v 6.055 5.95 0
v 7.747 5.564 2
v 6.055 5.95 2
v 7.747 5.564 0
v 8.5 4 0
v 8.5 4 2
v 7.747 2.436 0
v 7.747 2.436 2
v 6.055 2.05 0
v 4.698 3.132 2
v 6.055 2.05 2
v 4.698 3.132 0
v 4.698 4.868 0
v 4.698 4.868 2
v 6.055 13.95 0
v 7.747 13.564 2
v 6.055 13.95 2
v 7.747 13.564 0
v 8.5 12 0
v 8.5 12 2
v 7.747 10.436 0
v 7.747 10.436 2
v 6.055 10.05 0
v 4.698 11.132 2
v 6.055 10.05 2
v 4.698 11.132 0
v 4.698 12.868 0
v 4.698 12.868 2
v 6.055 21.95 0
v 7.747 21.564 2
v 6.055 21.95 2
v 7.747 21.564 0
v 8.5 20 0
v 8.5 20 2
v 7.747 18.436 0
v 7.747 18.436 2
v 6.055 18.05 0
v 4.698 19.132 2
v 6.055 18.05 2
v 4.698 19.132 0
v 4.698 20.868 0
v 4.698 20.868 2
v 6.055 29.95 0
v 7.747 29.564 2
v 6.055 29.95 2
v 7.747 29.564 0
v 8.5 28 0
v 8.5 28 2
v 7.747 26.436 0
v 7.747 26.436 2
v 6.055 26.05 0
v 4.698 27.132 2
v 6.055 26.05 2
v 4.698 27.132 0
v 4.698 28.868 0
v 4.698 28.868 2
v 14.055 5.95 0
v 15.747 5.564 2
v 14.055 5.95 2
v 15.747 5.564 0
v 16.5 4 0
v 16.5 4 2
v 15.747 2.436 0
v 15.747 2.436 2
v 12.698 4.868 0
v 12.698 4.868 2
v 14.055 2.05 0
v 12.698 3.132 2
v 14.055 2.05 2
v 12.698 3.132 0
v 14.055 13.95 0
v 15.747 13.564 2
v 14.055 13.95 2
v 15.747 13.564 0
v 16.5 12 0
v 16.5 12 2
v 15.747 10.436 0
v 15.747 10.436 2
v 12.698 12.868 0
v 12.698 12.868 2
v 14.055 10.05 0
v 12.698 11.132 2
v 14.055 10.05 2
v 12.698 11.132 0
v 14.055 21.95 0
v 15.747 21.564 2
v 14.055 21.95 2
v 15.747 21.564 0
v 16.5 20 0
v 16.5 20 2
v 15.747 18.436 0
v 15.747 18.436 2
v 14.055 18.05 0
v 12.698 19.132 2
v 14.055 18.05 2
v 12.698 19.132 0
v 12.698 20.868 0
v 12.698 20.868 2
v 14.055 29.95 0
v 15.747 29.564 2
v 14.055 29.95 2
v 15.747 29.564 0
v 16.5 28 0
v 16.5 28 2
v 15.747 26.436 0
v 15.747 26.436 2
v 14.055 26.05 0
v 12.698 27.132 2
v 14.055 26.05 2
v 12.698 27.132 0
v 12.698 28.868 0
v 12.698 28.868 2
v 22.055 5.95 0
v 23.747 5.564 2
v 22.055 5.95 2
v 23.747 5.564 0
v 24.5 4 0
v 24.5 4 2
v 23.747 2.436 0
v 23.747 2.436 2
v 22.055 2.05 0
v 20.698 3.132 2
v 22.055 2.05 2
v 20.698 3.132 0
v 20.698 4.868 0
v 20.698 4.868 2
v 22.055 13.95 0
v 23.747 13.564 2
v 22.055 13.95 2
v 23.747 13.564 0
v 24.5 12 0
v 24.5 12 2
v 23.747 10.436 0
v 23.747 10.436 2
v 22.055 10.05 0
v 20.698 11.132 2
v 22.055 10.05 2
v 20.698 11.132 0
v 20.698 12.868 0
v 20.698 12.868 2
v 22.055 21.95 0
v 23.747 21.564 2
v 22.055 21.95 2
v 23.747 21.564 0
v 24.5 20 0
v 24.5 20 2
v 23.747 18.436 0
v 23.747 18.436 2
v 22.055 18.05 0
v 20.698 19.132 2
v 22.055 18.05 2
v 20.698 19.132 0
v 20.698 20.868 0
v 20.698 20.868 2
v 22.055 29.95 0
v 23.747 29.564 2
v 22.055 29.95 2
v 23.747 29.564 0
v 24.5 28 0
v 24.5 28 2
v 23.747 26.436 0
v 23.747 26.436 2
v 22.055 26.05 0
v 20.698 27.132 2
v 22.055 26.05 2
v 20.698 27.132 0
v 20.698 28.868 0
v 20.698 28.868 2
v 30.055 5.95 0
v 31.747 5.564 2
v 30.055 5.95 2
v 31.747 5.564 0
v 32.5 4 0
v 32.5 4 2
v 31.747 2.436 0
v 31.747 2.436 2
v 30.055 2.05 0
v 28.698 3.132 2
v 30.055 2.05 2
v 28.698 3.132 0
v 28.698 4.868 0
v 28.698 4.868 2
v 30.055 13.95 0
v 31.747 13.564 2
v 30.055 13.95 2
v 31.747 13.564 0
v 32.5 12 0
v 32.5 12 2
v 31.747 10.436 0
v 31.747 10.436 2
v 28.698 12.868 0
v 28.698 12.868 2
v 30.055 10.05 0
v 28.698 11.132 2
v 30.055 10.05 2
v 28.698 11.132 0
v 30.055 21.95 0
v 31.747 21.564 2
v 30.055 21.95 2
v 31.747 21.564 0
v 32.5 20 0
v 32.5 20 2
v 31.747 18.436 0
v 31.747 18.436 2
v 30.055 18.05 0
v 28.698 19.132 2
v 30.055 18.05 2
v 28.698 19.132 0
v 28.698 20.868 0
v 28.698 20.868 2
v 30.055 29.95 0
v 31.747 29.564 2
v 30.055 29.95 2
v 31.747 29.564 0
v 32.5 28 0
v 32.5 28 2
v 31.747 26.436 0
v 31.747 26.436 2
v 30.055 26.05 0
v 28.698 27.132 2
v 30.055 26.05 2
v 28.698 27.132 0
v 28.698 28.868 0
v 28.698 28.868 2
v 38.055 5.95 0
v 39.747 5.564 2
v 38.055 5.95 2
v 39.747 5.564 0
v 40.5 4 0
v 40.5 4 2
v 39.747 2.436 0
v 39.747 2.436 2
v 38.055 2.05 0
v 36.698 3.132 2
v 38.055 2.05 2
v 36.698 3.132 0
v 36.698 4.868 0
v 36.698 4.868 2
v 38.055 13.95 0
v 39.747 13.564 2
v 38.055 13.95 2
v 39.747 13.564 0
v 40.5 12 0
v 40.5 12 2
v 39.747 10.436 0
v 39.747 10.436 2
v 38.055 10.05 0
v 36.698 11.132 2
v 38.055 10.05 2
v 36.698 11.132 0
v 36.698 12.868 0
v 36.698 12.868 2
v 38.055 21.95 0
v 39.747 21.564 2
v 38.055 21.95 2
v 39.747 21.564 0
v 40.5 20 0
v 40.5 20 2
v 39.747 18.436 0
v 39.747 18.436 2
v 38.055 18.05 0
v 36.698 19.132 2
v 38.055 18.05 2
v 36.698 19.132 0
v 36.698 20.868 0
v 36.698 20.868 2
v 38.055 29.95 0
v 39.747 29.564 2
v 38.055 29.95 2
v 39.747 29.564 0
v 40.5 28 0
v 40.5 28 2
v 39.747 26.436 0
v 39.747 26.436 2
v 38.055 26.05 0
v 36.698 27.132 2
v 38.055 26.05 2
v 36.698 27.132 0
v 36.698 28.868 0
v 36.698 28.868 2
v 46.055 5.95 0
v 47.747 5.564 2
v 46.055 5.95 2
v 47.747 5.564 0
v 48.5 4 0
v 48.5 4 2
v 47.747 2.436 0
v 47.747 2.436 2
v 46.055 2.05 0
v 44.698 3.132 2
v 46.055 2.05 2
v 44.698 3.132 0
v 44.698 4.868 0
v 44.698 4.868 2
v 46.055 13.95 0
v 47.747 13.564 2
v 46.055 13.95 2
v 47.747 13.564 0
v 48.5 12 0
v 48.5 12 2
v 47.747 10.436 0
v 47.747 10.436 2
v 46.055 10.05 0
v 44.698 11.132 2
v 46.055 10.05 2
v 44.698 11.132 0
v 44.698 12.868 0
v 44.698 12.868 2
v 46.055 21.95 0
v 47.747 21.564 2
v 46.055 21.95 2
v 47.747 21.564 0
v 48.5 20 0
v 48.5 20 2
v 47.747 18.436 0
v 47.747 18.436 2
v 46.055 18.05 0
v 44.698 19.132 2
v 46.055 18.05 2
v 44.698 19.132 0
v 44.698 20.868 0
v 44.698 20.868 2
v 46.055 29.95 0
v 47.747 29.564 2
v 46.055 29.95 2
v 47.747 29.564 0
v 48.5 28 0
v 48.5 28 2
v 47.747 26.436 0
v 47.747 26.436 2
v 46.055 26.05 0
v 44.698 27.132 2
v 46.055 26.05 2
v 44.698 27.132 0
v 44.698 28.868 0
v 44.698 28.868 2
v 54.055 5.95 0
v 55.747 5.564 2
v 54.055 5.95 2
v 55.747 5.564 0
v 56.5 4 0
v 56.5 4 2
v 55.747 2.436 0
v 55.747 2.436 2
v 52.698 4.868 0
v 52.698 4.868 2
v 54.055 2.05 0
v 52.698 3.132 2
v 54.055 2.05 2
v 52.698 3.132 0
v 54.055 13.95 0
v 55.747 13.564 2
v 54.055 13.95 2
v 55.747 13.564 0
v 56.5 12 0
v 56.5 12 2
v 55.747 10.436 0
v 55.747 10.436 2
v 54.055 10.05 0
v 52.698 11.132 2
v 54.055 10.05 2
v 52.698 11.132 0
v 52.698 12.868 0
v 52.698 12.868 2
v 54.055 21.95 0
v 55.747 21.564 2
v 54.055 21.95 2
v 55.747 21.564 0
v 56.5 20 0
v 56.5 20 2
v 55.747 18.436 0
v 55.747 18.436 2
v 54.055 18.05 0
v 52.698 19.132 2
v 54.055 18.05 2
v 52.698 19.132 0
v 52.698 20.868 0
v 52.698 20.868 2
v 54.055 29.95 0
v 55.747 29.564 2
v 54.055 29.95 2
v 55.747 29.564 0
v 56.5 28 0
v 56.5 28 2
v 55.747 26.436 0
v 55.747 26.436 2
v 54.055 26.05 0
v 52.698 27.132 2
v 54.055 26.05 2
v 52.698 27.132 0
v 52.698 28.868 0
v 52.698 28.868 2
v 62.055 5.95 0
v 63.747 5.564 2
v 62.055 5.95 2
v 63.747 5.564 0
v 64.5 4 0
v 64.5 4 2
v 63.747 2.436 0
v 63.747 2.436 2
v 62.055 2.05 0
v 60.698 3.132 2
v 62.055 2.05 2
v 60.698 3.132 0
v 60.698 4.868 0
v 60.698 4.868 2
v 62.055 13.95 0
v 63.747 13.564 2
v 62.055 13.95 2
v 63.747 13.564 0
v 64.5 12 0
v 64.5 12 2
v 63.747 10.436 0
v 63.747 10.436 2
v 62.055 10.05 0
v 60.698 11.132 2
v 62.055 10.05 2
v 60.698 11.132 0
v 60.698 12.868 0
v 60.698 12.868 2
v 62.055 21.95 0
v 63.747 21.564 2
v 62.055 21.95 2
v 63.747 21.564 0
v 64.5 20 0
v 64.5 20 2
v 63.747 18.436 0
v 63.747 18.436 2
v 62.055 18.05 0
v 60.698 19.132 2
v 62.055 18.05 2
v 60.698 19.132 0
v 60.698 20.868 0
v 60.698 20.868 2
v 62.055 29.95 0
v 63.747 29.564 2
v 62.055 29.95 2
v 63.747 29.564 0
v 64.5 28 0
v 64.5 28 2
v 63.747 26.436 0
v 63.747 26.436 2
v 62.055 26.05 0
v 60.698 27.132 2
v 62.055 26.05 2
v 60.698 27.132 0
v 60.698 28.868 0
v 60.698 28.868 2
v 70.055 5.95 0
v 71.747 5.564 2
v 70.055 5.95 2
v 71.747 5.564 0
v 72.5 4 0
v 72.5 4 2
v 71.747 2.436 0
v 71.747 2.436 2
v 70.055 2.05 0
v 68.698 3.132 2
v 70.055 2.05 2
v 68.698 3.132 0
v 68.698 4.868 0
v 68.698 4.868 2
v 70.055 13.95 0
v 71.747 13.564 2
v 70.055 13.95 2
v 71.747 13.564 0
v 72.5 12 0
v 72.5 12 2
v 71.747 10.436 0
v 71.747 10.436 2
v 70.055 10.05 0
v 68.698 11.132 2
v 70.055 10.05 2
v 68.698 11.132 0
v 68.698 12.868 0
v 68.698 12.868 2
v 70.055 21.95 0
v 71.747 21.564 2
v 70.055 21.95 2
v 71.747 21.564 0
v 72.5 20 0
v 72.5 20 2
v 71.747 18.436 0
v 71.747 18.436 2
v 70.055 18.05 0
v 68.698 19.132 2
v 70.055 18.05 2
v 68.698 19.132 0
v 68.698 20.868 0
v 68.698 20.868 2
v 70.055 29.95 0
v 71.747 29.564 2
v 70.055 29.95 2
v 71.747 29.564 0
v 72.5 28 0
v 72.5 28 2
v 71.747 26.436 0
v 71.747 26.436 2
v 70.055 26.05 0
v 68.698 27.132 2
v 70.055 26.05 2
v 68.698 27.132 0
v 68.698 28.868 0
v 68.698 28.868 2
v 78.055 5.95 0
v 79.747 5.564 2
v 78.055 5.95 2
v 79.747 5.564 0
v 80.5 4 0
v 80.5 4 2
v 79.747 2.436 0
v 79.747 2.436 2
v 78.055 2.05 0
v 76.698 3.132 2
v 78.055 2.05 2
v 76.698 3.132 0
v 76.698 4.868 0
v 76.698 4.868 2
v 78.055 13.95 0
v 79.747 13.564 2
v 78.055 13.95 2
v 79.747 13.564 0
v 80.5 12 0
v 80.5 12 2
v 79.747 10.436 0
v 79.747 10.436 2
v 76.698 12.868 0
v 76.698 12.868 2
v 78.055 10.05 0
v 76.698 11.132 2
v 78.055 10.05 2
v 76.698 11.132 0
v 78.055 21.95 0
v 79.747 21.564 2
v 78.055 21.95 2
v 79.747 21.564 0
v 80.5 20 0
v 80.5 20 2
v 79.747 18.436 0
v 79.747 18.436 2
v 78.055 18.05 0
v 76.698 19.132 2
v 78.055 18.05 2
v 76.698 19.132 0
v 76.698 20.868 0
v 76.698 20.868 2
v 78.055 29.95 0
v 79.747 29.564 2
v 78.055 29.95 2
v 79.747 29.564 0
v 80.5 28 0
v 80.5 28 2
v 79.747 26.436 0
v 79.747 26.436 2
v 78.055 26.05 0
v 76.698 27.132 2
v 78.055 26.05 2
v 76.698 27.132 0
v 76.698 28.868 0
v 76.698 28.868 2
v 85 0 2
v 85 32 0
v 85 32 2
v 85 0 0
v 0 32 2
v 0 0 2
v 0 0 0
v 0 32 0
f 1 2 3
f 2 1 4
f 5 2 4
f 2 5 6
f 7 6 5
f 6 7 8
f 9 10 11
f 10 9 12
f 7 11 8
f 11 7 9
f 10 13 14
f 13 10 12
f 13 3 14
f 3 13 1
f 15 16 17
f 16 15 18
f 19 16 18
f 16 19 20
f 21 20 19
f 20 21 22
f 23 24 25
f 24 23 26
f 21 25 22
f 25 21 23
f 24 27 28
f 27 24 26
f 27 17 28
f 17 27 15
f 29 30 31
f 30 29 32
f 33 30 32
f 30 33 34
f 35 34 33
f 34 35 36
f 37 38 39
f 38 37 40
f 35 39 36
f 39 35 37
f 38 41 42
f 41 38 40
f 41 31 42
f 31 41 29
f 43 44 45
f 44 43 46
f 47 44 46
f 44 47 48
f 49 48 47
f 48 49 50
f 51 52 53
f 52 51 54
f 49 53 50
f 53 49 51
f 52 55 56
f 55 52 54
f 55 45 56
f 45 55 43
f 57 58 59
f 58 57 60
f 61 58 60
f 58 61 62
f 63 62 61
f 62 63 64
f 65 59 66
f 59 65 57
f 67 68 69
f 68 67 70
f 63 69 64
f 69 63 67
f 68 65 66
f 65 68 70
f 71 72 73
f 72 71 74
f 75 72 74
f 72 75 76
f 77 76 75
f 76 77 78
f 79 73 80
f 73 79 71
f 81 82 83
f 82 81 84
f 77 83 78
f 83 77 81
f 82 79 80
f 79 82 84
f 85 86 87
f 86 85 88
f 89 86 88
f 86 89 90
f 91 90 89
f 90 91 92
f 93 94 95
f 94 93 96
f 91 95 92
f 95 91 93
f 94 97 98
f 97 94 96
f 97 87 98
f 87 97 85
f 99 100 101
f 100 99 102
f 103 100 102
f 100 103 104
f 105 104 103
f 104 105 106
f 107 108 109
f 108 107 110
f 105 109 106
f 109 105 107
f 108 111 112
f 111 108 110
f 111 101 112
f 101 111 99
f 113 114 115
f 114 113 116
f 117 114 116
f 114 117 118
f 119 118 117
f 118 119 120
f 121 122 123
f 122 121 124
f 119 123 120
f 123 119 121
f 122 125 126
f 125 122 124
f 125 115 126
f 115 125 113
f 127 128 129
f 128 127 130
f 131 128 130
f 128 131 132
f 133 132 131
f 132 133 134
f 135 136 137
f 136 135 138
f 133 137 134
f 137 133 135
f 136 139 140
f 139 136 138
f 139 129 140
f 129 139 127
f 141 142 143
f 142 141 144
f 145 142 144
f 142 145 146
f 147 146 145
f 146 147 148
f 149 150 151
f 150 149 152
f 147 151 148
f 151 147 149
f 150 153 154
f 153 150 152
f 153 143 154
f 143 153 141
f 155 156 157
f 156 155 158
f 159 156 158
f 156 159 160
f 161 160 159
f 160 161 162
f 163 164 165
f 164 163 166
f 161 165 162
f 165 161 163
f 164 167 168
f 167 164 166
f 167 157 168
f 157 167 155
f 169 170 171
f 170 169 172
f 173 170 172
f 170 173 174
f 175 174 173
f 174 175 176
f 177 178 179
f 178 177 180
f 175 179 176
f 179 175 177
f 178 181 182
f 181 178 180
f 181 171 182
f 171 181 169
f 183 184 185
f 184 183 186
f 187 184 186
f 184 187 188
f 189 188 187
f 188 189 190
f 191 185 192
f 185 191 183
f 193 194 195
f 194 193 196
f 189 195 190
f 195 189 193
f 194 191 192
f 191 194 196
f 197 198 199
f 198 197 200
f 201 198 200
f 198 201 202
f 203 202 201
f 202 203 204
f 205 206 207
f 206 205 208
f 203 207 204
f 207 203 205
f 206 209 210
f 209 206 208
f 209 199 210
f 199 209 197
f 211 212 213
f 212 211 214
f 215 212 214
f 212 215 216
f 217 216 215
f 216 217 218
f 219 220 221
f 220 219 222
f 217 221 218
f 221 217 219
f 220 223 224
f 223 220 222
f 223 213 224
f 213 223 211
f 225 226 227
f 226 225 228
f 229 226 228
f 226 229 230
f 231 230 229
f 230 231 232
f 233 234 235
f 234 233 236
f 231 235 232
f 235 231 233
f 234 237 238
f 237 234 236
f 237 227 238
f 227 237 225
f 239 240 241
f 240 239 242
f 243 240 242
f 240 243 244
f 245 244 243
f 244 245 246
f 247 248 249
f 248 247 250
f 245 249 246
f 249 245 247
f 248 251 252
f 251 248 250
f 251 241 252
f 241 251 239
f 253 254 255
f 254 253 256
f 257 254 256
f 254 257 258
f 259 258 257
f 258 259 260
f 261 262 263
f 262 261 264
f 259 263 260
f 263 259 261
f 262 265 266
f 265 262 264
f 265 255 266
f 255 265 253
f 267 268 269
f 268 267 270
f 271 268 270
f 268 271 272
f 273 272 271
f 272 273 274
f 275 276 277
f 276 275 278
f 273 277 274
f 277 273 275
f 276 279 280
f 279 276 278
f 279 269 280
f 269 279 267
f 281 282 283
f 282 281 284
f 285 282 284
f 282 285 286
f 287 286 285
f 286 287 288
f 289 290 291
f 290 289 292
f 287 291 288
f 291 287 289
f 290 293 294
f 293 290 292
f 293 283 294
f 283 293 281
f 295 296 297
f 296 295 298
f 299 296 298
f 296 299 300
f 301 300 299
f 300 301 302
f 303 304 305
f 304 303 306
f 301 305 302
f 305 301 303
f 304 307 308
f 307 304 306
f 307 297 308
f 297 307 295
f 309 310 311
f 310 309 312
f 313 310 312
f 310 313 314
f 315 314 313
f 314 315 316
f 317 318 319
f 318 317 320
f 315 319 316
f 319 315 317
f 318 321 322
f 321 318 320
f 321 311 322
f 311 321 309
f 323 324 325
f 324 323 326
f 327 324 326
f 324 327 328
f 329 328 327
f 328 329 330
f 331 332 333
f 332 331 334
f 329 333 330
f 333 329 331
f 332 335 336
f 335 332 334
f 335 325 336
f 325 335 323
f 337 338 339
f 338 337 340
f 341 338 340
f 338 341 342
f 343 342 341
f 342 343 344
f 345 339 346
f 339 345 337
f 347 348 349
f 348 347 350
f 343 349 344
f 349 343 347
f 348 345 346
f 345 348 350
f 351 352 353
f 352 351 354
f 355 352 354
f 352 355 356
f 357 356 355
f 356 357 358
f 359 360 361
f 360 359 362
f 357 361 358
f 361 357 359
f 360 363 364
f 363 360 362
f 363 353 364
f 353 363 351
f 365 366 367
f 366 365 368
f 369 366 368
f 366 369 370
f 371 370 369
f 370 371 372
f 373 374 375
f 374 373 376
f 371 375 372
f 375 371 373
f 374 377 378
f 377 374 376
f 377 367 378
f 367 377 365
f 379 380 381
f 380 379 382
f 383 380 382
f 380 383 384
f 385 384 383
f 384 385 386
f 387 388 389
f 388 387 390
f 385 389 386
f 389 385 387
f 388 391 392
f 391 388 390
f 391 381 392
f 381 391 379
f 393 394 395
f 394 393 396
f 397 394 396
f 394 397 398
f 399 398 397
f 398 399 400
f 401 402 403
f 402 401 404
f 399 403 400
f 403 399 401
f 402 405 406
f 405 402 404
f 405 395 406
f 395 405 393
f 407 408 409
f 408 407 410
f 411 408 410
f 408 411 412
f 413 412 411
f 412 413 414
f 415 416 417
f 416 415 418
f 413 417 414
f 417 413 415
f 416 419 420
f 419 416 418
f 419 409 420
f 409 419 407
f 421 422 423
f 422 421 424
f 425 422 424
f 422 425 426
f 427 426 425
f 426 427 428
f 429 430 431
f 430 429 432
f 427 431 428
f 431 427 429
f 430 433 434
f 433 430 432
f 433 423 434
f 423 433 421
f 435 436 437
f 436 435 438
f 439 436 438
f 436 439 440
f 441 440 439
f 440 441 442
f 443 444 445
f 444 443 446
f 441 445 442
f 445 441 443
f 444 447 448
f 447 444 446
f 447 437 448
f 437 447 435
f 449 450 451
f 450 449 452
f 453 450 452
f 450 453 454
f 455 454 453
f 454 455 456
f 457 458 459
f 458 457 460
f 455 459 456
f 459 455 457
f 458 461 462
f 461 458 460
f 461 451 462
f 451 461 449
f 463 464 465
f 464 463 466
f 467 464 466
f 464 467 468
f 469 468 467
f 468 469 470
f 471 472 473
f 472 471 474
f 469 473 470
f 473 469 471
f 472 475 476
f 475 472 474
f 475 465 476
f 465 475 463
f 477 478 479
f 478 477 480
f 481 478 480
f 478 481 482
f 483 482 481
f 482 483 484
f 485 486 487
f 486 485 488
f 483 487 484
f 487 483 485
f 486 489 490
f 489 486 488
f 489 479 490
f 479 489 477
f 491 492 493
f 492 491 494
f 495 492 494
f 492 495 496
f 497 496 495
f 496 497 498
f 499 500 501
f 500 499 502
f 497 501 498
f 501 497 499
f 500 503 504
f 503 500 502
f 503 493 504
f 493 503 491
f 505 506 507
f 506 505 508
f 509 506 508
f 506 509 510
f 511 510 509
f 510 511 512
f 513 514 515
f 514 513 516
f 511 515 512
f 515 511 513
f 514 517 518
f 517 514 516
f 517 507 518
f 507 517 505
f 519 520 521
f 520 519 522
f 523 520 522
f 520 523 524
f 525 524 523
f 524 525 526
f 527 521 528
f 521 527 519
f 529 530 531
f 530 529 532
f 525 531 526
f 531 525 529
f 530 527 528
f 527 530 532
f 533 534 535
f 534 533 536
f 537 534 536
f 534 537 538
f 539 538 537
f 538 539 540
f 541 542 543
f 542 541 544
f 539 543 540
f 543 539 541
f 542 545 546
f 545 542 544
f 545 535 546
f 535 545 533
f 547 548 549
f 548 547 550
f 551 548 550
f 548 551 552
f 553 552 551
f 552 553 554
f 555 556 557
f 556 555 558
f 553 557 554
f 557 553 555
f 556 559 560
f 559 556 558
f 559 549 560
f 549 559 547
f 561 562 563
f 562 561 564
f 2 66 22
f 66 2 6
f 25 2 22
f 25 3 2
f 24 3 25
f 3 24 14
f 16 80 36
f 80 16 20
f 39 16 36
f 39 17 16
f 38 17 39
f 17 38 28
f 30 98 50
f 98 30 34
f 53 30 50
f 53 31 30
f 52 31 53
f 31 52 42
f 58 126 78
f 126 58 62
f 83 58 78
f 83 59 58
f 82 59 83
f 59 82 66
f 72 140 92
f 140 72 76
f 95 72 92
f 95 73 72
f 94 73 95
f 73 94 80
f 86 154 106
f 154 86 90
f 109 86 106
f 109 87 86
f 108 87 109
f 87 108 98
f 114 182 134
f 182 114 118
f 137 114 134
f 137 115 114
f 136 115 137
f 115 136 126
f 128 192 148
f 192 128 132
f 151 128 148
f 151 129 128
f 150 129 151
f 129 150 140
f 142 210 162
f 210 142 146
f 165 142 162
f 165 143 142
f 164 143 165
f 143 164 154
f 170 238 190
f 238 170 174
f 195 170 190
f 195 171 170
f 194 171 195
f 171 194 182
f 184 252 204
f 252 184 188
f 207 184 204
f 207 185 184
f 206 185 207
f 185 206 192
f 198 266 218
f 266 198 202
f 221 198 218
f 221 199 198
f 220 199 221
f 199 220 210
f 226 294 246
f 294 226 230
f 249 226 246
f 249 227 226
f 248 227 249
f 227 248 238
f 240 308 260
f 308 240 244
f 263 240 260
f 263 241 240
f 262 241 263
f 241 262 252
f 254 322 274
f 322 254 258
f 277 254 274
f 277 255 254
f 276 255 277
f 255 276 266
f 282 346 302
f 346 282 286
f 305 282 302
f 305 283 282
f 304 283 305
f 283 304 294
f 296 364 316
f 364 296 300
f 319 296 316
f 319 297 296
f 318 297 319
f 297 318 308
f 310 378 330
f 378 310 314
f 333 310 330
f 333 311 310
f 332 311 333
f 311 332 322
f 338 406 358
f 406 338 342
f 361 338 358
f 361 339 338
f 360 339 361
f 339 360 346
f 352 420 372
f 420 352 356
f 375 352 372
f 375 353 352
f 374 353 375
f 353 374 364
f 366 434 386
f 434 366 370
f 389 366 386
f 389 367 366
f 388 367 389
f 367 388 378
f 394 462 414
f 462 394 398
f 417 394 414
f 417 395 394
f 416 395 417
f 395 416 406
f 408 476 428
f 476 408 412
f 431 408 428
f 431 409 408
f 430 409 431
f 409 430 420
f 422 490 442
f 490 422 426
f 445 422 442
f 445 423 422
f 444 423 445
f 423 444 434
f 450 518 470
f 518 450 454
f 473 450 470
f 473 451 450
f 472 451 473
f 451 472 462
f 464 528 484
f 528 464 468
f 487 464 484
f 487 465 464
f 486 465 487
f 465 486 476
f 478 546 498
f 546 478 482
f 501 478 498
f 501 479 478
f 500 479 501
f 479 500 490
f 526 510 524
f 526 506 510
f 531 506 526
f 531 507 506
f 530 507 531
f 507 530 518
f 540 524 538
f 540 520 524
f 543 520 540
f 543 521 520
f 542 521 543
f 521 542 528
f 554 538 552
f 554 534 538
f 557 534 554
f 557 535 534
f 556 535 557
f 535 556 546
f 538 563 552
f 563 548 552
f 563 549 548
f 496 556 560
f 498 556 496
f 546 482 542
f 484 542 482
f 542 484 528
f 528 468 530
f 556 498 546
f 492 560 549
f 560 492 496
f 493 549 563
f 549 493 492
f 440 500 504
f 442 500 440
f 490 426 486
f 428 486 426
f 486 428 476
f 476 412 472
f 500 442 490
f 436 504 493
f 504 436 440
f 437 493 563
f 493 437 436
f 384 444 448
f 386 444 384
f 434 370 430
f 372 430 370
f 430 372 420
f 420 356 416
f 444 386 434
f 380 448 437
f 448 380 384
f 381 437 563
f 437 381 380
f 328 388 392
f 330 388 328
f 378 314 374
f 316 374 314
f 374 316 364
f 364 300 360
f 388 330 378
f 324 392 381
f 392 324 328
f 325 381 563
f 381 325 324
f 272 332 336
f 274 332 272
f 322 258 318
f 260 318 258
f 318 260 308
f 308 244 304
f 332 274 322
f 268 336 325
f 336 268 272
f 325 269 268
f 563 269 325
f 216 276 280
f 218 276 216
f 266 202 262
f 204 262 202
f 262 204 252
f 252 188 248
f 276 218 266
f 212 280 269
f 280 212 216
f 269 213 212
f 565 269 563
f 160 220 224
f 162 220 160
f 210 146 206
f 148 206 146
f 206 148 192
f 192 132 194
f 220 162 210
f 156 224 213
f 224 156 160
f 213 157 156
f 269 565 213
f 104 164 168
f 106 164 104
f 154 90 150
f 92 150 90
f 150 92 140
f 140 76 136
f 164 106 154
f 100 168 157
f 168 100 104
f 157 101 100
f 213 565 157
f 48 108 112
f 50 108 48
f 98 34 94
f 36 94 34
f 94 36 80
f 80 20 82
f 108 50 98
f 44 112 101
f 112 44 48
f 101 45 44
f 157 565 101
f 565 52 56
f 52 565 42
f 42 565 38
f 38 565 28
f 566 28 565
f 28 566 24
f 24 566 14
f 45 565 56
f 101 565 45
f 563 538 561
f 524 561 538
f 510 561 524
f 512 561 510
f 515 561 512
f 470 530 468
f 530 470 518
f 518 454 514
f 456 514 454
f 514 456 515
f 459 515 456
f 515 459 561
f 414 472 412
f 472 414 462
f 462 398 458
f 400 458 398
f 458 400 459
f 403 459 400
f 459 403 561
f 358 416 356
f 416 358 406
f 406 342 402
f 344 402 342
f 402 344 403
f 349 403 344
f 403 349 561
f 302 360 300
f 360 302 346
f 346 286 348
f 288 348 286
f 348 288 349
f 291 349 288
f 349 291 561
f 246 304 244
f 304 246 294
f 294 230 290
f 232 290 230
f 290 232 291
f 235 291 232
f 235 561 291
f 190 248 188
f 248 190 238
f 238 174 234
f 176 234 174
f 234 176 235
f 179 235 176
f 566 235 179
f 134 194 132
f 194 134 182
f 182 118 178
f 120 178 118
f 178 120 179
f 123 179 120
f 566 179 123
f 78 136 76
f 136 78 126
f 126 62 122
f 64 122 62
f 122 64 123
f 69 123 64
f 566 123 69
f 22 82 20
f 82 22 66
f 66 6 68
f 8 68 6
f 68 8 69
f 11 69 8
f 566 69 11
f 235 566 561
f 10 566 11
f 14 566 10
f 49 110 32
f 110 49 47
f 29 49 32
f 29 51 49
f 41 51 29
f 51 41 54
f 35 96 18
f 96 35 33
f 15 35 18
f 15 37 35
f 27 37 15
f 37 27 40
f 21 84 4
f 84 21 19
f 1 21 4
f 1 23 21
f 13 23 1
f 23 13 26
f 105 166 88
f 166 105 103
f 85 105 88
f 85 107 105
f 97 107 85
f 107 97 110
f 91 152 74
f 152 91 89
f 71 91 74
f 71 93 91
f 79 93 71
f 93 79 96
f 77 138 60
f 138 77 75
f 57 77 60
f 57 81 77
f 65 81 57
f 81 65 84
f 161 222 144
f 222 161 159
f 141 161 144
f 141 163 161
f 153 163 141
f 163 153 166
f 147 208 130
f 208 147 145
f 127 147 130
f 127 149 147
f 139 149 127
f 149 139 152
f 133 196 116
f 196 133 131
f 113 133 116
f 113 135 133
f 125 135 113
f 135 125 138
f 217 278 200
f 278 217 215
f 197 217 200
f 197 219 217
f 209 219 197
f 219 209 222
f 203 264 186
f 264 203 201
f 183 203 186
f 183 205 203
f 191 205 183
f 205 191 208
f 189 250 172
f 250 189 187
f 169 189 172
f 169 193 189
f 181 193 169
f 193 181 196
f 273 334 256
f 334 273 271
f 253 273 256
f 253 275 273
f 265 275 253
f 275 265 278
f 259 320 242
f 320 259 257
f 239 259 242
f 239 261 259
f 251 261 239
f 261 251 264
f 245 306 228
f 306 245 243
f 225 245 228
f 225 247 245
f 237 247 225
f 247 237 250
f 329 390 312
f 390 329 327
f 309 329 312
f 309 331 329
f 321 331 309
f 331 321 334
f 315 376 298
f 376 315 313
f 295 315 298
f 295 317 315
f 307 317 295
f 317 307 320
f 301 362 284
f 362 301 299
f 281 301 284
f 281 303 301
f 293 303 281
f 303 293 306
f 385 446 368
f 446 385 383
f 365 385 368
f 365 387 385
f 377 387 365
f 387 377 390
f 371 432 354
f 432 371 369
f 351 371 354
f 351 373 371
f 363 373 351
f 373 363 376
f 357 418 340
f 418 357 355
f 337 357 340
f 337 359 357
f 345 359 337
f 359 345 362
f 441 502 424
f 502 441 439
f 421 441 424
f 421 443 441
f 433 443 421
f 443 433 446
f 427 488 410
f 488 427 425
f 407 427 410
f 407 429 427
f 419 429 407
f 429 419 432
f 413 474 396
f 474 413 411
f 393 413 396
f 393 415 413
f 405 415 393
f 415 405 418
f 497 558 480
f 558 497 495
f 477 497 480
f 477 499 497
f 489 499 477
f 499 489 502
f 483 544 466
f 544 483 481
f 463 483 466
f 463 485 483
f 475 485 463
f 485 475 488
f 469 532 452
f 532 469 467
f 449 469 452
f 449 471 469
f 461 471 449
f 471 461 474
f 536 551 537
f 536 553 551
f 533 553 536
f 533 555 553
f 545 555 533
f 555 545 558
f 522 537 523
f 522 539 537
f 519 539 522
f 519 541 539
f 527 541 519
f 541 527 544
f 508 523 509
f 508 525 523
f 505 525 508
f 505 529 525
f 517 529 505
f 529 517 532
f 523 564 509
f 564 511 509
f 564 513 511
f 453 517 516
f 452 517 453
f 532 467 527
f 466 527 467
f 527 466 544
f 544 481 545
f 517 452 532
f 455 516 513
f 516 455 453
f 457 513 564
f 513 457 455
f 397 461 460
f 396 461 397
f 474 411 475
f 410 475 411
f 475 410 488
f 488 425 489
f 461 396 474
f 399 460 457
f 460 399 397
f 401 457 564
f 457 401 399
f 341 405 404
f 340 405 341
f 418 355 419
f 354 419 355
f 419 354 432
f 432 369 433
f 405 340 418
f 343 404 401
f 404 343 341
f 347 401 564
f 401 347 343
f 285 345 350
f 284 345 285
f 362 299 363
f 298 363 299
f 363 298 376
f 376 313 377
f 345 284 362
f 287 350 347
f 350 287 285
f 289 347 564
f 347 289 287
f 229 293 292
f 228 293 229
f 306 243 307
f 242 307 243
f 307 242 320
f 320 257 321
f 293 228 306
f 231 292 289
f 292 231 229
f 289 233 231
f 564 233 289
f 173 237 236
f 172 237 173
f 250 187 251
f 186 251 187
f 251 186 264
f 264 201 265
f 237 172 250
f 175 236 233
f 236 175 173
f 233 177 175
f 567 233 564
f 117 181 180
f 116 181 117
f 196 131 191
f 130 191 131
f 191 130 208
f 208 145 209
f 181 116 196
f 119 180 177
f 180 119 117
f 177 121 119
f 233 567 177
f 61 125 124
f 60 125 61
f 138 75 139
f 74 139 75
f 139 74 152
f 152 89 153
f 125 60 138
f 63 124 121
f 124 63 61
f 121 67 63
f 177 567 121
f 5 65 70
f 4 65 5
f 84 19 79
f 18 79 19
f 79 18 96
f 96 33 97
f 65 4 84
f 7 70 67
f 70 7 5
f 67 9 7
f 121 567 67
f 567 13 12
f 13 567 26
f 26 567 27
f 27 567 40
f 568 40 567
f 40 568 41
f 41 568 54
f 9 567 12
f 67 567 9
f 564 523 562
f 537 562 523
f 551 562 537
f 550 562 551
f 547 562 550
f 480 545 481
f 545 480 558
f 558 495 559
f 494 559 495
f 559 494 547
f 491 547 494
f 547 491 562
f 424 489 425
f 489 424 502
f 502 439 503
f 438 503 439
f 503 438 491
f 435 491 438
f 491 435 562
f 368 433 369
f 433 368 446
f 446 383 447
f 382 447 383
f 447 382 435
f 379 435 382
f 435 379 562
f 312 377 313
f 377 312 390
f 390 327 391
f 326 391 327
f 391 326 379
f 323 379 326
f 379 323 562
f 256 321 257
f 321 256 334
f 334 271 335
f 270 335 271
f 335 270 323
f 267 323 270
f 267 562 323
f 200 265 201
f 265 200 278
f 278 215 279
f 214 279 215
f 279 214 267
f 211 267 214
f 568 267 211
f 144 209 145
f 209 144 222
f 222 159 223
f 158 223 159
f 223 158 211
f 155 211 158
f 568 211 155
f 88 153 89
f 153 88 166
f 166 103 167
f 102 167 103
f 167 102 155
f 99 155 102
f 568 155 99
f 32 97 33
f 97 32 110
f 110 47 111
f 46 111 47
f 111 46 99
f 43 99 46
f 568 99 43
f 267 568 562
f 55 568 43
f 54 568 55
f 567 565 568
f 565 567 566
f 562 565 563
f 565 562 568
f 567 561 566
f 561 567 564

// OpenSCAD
rangees_longueur = 10;
rangees_largeur =4;
epaisseur = 2;
difference(){
cube([5+rangees_longueur*8, rangees_largeur*8,epaisseur]);

union(){
for(i = [0:rangees_longueur-1]){
    for(j=[0: rangees_largeur]){
        translate([2.5+4+i*8, 4+j*8, -1]){
            cylinder(h=epaisseur+2, r= 2);
            }
        }
    }
}
}
